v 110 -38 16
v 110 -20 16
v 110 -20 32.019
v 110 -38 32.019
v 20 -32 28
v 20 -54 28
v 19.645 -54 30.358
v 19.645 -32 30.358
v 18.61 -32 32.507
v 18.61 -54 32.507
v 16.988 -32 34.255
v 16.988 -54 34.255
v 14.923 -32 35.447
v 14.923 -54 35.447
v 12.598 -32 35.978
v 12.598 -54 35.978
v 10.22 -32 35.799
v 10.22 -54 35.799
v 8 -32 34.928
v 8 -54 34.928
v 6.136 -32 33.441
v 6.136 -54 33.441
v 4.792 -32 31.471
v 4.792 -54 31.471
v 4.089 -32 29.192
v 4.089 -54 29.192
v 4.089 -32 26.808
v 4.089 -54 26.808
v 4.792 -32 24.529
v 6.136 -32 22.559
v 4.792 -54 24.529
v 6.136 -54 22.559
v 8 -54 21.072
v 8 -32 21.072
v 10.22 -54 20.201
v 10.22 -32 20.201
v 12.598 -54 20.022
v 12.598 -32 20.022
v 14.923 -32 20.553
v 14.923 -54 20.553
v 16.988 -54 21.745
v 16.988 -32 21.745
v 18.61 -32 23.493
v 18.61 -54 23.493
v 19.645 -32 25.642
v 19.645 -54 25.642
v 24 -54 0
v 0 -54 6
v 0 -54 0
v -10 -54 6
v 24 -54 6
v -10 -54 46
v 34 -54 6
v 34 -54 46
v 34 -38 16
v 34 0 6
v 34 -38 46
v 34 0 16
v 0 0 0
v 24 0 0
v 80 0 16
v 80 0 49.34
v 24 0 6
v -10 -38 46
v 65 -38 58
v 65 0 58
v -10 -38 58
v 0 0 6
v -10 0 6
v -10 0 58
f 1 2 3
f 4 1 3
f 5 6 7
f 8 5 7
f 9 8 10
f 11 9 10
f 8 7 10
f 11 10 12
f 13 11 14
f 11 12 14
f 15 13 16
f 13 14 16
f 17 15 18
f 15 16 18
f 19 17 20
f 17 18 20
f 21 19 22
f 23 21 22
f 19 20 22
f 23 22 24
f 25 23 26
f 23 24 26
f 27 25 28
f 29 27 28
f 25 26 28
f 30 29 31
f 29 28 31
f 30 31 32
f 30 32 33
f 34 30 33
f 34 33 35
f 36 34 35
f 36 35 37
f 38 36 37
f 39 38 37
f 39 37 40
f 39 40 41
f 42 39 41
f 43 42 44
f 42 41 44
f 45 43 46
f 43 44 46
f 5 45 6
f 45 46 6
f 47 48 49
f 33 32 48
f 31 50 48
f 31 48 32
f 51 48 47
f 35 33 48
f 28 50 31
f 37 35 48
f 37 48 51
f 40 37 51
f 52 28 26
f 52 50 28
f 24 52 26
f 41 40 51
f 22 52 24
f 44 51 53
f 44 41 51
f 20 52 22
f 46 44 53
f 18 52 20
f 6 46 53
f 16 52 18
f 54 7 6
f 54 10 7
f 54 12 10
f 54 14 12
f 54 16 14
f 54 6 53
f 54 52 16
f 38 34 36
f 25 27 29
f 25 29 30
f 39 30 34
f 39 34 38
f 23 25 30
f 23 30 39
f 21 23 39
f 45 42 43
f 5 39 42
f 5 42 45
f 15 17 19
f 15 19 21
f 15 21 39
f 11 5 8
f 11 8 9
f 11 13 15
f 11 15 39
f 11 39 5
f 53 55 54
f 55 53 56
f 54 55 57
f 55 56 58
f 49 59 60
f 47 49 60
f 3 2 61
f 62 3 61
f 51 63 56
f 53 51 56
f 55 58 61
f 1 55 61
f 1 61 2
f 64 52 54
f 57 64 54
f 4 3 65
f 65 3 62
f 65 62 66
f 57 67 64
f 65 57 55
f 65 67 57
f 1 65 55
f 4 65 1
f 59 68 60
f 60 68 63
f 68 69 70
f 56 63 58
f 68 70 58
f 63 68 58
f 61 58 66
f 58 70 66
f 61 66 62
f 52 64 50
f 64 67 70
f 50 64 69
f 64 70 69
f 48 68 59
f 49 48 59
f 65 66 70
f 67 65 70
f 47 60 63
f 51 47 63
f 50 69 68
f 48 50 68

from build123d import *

# Parameters (mm, degrees)
F1_DEPTH = 54
F3_DEPTH = 16
F4_R     = 8
F5_DEPTH = 22
F7_DEPTH = 42.001


with BuildPart() as f1:
    # F0 (on Front) → F1 (new body)
    with BuildSketch(Plane.XZ):
        Polygon((0, 6), (0, 0), (24, 0), (24, 6), (34, 6), (34, 16), (110, 16), (110, 32.019238), (65, 58), (-10, 58), (-10, 6), align=None)
    extrude(amount=F1_DEPTH)

    # F2 (on face) → F3 (cut)
    with BuildSketch(Plane.XZ.offset(54)):
        Polygon((65, 58), (-10, 58), (-10, 46), (34, 46), (34, 16), (110, 16), (110, 32.019238), align=None)
    extrude(amount=-F3_DEPTH, mode=Mode.SUBTRACT)

    # F4 (on face) → F5 (cut)
    with BuildSketch(Plane.XZ.offset(54)):
        with Locations((12, 28)):
            Circle(F4_R)
    extrude(amount=-F5_DEPTH, mode=Mode.SUBTRACT)

    # F6 (on face) → F7 (cut, through all)
    with BuildSketch(Plane(origin=(0, 0, 16), x_dir=(1, 0, 0), z_dir=(0, 0, -1))):
        Polygon((110, 20), (80, 0), (110, 0), align=None)
    extrude(amount=-F7_DEPTH, mode=Mode.SUBTRACT)


solid = f1.part
